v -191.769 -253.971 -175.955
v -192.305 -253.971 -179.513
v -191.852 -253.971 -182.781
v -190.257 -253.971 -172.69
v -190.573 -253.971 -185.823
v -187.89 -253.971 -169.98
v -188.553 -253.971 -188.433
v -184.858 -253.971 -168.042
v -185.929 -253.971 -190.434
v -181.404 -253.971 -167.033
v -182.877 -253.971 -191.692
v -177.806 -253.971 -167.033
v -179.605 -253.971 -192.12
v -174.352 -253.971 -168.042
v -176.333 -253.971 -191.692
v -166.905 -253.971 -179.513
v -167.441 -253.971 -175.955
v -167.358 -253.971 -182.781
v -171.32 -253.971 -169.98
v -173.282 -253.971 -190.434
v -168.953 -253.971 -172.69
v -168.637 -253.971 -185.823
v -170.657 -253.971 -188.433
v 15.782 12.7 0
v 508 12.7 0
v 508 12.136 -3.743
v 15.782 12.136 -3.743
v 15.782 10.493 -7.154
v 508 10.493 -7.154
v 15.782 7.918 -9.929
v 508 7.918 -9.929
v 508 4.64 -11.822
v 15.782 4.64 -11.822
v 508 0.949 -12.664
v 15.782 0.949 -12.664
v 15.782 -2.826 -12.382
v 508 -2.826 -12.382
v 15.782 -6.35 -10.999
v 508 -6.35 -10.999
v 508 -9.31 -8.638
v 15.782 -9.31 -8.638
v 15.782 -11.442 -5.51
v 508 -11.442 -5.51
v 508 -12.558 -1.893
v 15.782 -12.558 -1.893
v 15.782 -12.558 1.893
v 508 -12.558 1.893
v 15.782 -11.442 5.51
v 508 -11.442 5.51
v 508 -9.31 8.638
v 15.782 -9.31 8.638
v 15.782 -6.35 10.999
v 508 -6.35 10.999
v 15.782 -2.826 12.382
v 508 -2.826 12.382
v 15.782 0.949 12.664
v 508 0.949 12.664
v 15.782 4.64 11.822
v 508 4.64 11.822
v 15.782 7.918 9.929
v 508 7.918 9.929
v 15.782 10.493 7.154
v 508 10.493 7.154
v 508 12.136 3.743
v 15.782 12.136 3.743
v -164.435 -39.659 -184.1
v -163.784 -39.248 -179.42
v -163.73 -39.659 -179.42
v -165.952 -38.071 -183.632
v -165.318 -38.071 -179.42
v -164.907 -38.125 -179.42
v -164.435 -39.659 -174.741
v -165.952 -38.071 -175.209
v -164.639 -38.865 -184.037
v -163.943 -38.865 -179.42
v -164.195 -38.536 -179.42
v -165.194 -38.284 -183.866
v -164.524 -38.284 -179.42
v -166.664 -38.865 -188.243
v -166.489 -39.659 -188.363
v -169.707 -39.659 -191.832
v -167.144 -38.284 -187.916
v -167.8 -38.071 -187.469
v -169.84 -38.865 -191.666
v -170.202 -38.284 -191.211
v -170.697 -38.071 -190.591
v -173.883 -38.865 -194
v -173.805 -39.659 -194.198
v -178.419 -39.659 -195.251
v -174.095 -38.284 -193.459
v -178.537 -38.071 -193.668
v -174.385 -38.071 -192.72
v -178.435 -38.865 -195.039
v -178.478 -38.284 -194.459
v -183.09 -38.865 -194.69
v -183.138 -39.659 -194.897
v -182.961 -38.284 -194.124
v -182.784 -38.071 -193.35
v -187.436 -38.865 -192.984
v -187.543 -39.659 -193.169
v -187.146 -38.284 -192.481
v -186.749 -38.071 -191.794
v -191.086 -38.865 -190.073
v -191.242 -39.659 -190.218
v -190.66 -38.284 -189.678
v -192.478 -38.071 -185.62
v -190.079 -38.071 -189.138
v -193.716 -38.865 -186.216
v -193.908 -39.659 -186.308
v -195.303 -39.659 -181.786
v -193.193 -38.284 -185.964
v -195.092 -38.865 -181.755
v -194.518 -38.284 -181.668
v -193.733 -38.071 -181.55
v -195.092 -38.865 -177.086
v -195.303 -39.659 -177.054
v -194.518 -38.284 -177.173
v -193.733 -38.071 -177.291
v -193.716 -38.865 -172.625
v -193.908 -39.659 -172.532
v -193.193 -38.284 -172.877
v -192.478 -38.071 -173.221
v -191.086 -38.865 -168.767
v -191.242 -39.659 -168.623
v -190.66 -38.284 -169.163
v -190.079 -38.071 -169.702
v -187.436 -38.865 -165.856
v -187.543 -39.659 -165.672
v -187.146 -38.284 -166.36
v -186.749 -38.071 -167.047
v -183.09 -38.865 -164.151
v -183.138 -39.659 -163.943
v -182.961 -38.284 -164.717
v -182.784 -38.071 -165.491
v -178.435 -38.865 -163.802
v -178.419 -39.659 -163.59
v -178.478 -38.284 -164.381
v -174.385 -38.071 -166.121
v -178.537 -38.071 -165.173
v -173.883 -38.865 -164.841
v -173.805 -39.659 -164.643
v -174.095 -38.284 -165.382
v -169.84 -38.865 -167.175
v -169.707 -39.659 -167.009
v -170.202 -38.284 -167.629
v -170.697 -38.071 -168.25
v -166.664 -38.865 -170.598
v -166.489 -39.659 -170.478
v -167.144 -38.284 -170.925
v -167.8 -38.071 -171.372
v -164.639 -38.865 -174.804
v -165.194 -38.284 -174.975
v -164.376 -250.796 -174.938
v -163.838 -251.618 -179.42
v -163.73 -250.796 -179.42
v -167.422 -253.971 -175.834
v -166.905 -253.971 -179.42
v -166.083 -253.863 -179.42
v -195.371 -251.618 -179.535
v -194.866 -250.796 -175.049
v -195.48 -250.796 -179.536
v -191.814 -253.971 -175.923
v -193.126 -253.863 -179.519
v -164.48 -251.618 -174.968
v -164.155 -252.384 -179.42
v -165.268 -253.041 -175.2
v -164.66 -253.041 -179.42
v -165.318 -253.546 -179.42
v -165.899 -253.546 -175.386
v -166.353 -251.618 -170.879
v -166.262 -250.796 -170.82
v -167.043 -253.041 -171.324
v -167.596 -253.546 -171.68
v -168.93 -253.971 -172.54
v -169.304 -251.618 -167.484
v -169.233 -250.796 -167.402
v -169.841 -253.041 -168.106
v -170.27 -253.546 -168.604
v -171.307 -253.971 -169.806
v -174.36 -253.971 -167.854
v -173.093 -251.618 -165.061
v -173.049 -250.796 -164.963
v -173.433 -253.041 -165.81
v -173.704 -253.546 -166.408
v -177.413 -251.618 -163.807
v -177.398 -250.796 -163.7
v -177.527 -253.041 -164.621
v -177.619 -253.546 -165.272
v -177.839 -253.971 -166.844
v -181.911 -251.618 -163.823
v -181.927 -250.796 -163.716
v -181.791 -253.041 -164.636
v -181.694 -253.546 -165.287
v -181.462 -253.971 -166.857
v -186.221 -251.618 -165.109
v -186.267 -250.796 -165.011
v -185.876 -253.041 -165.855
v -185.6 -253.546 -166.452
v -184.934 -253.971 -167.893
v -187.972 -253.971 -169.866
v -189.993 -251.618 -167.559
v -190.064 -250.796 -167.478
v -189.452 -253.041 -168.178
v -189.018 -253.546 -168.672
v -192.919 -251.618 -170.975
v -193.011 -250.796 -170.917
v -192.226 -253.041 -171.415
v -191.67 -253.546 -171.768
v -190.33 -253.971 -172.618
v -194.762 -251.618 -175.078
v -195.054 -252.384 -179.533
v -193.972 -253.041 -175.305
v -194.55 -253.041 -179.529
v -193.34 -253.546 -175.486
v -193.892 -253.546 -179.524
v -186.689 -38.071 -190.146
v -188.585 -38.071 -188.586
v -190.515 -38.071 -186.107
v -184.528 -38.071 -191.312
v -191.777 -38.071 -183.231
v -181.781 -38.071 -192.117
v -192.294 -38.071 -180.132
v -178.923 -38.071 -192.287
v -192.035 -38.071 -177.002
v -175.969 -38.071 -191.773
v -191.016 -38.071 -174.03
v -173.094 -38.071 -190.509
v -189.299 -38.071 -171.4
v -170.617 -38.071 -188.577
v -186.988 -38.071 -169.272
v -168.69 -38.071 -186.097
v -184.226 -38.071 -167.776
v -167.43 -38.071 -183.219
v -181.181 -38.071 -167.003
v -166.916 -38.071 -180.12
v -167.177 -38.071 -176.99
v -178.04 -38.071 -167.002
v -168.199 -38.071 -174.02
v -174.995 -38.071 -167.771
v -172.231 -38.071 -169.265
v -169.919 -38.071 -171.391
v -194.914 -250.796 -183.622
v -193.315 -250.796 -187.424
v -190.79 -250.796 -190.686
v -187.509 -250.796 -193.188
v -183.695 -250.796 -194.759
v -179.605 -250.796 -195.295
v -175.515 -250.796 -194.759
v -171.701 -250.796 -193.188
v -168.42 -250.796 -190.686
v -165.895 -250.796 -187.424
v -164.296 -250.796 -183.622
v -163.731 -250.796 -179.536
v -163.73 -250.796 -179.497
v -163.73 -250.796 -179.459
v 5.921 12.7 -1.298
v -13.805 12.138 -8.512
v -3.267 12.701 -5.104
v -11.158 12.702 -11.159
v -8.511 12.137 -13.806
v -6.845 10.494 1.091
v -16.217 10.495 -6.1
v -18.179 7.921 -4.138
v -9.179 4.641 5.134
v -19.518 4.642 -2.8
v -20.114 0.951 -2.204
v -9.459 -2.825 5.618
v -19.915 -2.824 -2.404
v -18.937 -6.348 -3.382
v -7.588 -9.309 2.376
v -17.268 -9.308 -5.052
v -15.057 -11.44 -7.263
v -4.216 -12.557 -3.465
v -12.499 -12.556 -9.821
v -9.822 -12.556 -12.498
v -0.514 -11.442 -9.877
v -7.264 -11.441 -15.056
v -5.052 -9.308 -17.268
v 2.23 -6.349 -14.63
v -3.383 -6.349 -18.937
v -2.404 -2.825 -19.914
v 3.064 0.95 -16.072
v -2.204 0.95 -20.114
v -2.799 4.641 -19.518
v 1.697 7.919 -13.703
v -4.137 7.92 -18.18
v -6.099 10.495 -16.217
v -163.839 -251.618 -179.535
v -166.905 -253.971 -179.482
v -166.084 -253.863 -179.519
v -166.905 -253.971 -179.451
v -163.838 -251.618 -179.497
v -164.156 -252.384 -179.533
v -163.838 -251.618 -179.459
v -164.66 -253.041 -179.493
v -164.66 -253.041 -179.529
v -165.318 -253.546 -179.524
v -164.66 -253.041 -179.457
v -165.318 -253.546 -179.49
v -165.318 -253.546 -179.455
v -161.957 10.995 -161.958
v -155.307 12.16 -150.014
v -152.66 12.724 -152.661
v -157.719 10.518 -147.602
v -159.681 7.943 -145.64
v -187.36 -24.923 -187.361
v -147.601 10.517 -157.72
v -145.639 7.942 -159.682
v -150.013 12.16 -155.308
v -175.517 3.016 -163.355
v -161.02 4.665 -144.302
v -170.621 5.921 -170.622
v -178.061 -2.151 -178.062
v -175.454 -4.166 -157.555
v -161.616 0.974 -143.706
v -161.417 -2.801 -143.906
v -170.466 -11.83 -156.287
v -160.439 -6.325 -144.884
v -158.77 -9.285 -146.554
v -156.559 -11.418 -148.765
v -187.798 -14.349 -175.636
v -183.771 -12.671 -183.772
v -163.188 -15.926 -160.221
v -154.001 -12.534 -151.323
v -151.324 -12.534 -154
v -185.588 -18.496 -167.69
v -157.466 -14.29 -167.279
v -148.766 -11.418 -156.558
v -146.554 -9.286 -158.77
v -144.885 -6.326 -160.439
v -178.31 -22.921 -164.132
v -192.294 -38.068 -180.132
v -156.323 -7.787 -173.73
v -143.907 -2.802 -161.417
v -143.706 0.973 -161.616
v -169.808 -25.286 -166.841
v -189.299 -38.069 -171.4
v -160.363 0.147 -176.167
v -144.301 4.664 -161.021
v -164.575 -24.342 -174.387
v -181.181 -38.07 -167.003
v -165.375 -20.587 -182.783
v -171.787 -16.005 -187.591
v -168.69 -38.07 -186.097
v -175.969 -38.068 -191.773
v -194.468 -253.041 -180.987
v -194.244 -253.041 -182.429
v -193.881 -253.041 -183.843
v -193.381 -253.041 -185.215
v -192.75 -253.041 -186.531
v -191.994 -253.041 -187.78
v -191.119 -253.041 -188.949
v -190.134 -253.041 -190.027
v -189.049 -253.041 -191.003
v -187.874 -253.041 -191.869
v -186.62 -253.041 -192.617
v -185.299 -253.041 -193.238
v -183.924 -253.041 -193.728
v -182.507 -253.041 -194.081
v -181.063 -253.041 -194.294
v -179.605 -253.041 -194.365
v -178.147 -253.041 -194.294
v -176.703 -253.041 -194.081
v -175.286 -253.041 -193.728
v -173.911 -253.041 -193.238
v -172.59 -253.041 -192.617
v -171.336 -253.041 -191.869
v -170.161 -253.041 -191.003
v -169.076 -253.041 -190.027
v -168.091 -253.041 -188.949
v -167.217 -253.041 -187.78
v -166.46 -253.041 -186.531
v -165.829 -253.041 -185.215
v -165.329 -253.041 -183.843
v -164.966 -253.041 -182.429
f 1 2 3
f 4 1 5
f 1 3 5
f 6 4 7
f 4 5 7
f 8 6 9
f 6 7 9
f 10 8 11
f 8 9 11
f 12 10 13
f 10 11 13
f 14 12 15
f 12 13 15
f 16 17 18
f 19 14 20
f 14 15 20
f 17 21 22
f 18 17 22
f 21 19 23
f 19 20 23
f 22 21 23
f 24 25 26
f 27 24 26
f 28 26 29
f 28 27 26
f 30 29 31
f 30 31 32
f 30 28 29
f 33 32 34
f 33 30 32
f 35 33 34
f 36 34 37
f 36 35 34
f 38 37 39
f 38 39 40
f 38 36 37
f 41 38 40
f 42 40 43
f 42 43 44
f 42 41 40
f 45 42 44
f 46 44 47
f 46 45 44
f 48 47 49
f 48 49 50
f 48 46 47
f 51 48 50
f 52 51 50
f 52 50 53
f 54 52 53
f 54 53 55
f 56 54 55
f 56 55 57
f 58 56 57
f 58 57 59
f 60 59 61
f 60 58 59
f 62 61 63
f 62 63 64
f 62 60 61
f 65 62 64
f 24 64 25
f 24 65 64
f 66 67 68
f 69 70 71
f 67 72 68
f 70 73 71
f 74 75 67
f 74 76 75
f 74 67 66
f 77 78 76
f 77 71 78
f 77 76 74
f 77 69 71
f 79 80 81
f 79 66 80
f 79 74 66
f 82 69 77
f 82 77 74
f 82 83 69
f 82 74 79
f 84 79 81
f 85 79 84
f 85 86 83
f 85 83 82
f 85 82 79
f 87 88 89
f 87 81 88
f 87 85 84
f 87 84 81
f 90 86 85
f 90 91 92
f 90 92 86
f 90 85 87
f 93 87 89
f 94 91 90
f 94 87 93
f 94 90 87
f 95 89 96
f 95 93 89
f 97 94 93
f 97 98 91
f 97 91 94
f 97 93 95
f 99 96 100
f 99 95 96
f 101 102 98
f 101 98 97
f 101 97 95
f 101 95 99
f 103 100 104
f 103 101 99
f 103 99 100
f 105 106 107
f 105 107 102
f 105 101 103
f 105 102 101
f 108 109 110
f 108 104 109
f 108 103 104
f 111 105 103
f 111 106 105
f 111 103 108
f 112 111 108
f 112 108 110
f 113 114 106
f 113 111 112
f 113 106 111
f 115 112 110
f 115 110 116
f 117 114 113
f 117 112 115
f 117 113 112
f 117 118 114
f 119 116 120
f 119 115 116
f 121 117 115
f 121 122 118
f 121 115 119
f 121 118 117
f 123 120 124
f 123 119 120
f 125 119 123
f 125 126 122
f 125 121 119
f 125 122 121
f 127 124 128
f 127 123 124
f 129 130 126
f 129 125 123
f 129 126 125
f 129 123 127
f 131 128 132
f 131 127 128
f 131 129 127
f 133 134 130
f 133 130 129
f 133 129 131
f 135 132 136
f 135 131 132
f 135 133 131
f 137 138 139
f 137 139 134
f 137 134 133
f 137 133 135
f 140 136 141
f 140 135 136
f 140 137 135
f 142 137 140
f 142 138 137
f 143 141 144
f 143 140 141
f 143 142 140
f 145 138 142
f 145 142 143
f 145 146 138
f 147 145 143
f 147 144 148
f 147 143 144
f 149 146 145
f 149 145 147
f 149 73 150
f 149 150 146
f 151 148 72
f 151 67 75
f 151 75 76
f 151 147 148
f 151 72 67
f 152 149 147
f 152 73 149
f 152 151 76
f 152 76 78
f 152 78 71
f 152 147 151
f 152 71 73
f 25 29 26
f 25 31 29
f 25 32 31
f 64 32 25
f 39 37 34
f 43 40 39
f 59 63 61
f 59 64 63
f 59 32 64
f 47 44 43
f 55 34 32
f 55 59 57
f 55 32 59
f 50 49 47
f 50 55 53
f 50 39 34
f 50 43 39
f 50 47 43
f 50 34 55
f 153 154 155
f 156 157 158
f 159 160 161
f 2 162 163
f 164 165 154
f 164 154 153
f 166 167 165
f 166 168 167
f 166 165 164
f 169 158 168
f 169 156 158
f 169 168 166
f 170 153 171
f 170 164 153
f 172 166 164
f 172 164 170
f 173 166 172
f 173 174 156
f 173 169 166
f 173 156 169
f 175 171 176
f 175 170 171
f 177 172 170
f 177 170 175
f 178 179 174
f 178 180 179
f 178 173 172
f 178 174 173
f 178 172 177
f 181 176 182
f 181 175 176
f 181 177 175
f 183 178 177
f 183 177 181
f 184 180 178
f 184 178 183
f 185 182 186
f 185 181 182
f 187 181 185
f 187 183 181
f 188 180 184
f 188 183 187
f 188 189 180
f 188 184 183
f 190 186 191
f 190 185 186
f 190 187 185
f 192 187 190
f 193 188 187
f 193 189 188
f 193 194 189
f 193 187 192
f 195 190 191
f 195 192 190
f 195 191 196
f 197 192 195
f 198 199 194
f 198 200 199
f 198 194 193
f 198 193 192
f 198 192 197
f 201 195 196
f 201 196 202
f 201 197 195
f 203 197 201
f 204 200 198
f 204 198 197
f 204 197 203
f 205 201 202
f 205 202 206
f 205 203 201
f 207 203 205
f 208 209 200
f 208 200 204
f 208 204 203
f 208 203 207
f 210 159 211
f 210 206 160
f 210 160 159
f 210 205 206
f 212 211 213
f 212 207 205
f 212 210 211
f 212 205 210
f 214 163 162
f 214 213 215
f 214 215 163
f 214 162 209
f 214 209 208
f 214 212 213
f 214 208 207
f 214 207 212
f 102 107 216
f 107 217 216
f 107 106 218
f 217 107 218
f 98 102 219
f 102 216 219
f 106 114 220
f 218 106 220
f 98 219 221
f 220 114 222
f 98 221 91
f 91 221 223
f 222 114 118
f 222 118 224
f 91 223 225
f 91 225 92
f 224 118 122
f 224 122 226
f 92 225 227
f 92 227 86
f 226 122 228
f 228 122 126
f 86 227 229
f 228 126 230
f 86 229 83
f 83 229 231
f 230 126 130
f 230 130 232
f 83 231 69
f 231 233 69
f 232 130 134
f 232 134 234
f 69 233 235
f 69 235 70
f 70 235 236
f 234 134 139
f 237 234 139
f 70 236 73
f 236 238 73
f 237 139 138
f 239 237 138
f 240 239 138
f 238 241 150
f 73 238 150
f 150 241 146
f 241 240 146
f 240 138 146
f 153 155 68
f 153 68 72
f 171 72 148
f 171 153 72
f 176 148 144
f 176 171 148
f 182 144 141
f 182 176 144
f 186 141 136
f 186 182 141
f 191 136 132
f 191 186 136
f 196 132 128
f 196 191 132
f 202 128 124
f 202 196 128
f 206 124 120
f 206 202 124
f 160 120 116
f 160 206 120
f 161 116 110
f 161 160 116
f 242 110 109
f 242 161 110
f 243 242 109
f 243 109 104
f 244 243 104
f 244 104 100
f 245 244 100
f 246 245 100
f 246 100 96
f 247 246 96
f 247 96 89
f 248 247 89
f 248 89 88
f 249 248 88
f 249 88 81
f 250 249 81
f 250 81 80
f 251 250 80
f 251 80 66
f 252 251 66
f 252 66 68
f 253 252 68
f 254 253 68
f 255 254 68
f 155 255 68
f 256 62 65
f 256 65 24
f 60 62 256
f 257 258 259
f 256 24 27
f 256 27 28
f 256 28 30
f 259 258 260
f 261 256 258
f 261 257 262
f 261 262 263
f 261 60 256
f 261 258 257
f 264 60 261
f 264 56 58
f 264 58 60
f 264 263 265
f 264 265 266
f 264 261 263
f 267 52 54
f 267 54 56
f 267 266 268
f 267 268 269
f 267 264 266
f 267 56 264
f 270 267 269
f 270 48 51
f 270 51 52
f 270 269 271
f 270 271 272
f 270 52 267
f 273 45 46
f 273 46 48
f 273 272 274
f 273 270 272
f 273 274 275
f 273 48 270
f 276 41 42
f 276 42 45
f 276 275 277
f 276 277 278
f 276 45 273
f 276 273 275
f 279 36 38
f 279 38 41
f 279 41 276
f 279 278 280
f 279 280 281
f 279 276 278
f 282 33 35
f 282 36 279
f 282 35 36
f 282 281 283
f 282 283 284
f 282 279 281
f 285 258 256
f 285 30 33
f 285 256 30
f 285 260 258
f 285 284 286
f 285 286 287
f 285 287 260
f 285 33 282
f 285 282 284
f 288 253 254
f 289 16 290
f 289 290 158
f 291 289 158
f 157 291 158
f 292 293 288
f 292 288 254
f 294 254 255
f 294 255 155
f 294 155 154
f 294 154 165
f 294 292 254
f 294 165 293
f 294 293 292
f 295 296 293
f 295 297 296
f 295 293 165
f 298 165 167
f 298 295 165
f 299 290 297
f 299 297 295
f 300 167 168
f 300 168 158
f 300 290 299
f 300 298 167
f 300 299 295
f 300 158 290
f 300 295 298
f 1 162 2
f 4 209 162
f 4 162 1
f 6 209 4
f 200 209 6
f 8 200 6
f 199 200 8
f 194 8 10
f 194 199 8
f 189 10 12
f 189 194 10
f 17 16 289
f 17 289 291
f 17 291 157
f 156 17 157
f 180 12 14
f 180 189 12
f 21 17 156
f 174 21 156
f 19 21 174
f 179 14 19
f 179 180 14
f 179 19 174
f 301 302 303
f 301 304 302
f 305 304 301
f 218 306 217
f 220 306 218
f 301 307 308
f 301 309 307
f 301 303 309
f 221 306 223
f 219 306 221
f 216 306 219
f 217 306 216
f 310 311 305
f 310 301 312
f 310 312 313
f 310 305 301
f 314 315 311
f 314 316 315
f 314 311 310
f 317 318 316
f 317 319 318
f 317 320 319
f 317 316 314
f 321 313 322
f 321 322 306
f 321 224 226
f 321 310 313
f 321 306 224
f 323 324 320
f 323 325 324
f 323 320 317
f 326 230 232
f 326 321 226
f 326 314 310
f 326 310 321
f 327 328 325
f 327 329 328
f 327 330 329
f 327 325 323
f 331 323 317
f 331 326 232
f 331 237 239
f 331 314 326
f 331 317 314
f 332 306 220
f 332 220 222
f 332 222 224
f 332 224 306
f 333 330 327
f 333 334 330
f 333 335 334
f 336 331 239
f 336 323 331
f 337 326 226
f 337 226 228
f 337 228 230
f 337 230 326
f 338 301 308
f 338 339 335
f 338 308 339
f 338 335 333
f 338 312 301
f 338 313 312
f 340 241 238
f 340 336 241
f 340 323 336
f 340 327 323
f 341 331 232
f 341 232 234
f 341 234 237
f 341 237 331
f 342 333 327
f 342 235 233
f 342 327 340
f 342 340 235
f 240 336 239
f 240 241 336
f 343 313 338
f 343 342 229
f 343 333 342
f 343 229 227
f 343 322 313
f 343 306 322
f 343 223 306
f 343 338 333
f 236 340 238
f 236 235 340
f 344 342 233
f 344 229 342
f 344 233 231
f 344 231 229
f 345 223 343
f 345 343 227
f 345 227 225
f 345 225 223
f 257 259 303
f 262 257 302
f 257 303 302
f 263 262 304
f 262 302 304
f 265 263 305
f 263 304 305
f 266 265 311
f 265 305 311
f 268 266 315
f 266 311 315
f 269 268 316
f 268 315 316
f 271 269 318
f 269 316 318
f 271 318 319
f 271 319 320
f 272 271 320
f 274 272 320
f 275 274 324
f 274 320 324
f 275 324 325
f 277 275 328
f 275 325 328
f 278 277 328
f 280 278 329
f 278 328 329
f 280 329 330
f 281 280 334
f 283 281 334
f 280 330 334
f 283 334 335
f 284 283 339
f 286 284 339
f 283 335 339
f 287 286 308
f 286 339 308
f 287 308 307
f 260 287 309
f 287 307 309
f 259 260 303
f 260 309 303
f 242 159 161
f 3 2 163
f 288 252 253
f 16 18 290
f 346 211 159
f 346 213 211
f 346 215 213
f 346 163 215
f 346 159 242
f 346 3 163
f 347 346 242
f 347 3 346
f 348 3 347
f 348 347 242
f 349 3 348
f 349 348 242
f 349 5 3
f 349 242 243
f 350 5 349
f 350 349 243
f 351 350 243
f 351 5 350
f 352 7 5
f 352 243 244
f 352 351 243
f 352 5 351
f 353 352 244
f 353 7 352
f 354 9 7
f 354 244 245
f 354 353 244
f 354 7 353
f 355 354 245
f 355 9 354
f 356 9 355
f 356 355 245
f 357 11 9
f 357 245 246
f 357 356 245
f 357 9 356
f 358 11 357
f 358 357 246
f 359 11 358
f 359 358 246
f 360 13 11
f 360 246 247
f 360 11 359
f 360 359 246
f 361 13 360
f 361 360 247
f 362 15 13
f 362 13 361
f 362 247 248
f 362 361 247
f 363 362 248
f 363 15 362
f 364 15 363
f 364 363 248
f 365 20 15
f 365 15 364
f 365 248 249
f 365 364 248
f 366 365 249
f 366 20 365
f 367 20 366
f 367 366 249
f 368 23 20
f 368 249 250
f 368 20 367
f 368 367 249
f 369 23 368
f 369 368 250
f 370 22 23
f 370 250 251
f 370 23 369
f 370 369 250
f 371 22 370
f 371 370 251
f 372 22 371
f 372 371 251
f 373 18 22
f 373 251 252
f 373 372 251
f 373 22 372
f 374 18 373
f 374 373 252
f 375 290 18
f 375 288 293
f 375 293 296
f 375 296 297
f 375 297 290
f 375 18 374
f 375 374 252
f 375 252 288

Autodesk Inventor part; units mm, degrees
ref_plane "XZ Plane" through (0, 0, 0) normal (0, 1, 0) x (-1, 0, 0)
ref_plane "XY Plane" through (0, 0, 0) normal (0, 0, 1) x (1, 0, 0)
ref_plane "Work Plane1" through (508, 0, 0) normal (1, 0, 0) x (0, 1, 0)
sketch "Sketch13" plane through (508, 0, 0) normal (1, 0, 0) x (0, 1, 0)
  circle A0 centre (0, 0) radius 12.7
  point P0 (0, 0)
  dimension "d79" = 25.4
sketch3d "3D Sketch1"
  line L0 (508, 0, 0) -> (15.7815, 0, 0)
  arc A0 (15.7815, 0, 0) -> (-11.1592, 0.0018, -11.1592) centre (15.7815, 0.0061, -38.1) ccw
  line L1 (-11.1592, 0.0018, -11.1592) -> (-152.6613, 0.0245, -152.6613)
  arc A1 (-152.6613, 0.0245, -152.6613) -> (-179.6051, -38.0755, -179.6051) centre (-152.6644, -38.0755, -152.6644) ccw
  line L2 (-179.6051, -38.0755, -179.6051) -> (-179.6051, -253.9712, -179.6051)
  dimension "d73" = 508
  dimension "d74" = 135
  dimension "d75" = 254
  dimension "d76" = 254
  dimension "d77" = 38.1
  dimension "d78" = 38.1
sweep "Sweep1" add profiles "Sketch13" path "3D Sketch1"
sketch "Sketch14" plane through (-179.6051, -253.9712, -179.6051) normal (0, -1, 0) x (1, 0, 0)
  circle A0 centre (0, 0.1847) radius 15.875
  point P0 (179.6051, 179.6051)
  dimension "d82" = 31.75
extrude "Extrusion1" add sketch "Sketch14" against normal blind 215.9
fillet "Fillet1" radius 3.175 1 edges at (-195.4801, -253.9712, -179.4205)
fillet "Fillet2" radius 1.5875 1 edges at (-195.4801, -38.0712, -179.4205)
equation "\"d78\" = d77"
equation "\"BendRadius\" = Thickness"
equation "\"BendReliefWidth\" = Thickness"
equation "\"BendReliefDepth\" = 0.5 * Thickness"
equation "\"CornerReliefSize\" = 4 * Thickness"
equation "\"MinimumRemnant\" = 2 * Thickness"
equation "\"TransitionRadius\" = BendRadius"
equation "\"JacobiRadiusSize\" = BendRadius"
equation "\"GapSize\" = Thickness"
equation "\"Thickness\" = 9.525"
properties part number "5th Wheel Hitch Part 4"
